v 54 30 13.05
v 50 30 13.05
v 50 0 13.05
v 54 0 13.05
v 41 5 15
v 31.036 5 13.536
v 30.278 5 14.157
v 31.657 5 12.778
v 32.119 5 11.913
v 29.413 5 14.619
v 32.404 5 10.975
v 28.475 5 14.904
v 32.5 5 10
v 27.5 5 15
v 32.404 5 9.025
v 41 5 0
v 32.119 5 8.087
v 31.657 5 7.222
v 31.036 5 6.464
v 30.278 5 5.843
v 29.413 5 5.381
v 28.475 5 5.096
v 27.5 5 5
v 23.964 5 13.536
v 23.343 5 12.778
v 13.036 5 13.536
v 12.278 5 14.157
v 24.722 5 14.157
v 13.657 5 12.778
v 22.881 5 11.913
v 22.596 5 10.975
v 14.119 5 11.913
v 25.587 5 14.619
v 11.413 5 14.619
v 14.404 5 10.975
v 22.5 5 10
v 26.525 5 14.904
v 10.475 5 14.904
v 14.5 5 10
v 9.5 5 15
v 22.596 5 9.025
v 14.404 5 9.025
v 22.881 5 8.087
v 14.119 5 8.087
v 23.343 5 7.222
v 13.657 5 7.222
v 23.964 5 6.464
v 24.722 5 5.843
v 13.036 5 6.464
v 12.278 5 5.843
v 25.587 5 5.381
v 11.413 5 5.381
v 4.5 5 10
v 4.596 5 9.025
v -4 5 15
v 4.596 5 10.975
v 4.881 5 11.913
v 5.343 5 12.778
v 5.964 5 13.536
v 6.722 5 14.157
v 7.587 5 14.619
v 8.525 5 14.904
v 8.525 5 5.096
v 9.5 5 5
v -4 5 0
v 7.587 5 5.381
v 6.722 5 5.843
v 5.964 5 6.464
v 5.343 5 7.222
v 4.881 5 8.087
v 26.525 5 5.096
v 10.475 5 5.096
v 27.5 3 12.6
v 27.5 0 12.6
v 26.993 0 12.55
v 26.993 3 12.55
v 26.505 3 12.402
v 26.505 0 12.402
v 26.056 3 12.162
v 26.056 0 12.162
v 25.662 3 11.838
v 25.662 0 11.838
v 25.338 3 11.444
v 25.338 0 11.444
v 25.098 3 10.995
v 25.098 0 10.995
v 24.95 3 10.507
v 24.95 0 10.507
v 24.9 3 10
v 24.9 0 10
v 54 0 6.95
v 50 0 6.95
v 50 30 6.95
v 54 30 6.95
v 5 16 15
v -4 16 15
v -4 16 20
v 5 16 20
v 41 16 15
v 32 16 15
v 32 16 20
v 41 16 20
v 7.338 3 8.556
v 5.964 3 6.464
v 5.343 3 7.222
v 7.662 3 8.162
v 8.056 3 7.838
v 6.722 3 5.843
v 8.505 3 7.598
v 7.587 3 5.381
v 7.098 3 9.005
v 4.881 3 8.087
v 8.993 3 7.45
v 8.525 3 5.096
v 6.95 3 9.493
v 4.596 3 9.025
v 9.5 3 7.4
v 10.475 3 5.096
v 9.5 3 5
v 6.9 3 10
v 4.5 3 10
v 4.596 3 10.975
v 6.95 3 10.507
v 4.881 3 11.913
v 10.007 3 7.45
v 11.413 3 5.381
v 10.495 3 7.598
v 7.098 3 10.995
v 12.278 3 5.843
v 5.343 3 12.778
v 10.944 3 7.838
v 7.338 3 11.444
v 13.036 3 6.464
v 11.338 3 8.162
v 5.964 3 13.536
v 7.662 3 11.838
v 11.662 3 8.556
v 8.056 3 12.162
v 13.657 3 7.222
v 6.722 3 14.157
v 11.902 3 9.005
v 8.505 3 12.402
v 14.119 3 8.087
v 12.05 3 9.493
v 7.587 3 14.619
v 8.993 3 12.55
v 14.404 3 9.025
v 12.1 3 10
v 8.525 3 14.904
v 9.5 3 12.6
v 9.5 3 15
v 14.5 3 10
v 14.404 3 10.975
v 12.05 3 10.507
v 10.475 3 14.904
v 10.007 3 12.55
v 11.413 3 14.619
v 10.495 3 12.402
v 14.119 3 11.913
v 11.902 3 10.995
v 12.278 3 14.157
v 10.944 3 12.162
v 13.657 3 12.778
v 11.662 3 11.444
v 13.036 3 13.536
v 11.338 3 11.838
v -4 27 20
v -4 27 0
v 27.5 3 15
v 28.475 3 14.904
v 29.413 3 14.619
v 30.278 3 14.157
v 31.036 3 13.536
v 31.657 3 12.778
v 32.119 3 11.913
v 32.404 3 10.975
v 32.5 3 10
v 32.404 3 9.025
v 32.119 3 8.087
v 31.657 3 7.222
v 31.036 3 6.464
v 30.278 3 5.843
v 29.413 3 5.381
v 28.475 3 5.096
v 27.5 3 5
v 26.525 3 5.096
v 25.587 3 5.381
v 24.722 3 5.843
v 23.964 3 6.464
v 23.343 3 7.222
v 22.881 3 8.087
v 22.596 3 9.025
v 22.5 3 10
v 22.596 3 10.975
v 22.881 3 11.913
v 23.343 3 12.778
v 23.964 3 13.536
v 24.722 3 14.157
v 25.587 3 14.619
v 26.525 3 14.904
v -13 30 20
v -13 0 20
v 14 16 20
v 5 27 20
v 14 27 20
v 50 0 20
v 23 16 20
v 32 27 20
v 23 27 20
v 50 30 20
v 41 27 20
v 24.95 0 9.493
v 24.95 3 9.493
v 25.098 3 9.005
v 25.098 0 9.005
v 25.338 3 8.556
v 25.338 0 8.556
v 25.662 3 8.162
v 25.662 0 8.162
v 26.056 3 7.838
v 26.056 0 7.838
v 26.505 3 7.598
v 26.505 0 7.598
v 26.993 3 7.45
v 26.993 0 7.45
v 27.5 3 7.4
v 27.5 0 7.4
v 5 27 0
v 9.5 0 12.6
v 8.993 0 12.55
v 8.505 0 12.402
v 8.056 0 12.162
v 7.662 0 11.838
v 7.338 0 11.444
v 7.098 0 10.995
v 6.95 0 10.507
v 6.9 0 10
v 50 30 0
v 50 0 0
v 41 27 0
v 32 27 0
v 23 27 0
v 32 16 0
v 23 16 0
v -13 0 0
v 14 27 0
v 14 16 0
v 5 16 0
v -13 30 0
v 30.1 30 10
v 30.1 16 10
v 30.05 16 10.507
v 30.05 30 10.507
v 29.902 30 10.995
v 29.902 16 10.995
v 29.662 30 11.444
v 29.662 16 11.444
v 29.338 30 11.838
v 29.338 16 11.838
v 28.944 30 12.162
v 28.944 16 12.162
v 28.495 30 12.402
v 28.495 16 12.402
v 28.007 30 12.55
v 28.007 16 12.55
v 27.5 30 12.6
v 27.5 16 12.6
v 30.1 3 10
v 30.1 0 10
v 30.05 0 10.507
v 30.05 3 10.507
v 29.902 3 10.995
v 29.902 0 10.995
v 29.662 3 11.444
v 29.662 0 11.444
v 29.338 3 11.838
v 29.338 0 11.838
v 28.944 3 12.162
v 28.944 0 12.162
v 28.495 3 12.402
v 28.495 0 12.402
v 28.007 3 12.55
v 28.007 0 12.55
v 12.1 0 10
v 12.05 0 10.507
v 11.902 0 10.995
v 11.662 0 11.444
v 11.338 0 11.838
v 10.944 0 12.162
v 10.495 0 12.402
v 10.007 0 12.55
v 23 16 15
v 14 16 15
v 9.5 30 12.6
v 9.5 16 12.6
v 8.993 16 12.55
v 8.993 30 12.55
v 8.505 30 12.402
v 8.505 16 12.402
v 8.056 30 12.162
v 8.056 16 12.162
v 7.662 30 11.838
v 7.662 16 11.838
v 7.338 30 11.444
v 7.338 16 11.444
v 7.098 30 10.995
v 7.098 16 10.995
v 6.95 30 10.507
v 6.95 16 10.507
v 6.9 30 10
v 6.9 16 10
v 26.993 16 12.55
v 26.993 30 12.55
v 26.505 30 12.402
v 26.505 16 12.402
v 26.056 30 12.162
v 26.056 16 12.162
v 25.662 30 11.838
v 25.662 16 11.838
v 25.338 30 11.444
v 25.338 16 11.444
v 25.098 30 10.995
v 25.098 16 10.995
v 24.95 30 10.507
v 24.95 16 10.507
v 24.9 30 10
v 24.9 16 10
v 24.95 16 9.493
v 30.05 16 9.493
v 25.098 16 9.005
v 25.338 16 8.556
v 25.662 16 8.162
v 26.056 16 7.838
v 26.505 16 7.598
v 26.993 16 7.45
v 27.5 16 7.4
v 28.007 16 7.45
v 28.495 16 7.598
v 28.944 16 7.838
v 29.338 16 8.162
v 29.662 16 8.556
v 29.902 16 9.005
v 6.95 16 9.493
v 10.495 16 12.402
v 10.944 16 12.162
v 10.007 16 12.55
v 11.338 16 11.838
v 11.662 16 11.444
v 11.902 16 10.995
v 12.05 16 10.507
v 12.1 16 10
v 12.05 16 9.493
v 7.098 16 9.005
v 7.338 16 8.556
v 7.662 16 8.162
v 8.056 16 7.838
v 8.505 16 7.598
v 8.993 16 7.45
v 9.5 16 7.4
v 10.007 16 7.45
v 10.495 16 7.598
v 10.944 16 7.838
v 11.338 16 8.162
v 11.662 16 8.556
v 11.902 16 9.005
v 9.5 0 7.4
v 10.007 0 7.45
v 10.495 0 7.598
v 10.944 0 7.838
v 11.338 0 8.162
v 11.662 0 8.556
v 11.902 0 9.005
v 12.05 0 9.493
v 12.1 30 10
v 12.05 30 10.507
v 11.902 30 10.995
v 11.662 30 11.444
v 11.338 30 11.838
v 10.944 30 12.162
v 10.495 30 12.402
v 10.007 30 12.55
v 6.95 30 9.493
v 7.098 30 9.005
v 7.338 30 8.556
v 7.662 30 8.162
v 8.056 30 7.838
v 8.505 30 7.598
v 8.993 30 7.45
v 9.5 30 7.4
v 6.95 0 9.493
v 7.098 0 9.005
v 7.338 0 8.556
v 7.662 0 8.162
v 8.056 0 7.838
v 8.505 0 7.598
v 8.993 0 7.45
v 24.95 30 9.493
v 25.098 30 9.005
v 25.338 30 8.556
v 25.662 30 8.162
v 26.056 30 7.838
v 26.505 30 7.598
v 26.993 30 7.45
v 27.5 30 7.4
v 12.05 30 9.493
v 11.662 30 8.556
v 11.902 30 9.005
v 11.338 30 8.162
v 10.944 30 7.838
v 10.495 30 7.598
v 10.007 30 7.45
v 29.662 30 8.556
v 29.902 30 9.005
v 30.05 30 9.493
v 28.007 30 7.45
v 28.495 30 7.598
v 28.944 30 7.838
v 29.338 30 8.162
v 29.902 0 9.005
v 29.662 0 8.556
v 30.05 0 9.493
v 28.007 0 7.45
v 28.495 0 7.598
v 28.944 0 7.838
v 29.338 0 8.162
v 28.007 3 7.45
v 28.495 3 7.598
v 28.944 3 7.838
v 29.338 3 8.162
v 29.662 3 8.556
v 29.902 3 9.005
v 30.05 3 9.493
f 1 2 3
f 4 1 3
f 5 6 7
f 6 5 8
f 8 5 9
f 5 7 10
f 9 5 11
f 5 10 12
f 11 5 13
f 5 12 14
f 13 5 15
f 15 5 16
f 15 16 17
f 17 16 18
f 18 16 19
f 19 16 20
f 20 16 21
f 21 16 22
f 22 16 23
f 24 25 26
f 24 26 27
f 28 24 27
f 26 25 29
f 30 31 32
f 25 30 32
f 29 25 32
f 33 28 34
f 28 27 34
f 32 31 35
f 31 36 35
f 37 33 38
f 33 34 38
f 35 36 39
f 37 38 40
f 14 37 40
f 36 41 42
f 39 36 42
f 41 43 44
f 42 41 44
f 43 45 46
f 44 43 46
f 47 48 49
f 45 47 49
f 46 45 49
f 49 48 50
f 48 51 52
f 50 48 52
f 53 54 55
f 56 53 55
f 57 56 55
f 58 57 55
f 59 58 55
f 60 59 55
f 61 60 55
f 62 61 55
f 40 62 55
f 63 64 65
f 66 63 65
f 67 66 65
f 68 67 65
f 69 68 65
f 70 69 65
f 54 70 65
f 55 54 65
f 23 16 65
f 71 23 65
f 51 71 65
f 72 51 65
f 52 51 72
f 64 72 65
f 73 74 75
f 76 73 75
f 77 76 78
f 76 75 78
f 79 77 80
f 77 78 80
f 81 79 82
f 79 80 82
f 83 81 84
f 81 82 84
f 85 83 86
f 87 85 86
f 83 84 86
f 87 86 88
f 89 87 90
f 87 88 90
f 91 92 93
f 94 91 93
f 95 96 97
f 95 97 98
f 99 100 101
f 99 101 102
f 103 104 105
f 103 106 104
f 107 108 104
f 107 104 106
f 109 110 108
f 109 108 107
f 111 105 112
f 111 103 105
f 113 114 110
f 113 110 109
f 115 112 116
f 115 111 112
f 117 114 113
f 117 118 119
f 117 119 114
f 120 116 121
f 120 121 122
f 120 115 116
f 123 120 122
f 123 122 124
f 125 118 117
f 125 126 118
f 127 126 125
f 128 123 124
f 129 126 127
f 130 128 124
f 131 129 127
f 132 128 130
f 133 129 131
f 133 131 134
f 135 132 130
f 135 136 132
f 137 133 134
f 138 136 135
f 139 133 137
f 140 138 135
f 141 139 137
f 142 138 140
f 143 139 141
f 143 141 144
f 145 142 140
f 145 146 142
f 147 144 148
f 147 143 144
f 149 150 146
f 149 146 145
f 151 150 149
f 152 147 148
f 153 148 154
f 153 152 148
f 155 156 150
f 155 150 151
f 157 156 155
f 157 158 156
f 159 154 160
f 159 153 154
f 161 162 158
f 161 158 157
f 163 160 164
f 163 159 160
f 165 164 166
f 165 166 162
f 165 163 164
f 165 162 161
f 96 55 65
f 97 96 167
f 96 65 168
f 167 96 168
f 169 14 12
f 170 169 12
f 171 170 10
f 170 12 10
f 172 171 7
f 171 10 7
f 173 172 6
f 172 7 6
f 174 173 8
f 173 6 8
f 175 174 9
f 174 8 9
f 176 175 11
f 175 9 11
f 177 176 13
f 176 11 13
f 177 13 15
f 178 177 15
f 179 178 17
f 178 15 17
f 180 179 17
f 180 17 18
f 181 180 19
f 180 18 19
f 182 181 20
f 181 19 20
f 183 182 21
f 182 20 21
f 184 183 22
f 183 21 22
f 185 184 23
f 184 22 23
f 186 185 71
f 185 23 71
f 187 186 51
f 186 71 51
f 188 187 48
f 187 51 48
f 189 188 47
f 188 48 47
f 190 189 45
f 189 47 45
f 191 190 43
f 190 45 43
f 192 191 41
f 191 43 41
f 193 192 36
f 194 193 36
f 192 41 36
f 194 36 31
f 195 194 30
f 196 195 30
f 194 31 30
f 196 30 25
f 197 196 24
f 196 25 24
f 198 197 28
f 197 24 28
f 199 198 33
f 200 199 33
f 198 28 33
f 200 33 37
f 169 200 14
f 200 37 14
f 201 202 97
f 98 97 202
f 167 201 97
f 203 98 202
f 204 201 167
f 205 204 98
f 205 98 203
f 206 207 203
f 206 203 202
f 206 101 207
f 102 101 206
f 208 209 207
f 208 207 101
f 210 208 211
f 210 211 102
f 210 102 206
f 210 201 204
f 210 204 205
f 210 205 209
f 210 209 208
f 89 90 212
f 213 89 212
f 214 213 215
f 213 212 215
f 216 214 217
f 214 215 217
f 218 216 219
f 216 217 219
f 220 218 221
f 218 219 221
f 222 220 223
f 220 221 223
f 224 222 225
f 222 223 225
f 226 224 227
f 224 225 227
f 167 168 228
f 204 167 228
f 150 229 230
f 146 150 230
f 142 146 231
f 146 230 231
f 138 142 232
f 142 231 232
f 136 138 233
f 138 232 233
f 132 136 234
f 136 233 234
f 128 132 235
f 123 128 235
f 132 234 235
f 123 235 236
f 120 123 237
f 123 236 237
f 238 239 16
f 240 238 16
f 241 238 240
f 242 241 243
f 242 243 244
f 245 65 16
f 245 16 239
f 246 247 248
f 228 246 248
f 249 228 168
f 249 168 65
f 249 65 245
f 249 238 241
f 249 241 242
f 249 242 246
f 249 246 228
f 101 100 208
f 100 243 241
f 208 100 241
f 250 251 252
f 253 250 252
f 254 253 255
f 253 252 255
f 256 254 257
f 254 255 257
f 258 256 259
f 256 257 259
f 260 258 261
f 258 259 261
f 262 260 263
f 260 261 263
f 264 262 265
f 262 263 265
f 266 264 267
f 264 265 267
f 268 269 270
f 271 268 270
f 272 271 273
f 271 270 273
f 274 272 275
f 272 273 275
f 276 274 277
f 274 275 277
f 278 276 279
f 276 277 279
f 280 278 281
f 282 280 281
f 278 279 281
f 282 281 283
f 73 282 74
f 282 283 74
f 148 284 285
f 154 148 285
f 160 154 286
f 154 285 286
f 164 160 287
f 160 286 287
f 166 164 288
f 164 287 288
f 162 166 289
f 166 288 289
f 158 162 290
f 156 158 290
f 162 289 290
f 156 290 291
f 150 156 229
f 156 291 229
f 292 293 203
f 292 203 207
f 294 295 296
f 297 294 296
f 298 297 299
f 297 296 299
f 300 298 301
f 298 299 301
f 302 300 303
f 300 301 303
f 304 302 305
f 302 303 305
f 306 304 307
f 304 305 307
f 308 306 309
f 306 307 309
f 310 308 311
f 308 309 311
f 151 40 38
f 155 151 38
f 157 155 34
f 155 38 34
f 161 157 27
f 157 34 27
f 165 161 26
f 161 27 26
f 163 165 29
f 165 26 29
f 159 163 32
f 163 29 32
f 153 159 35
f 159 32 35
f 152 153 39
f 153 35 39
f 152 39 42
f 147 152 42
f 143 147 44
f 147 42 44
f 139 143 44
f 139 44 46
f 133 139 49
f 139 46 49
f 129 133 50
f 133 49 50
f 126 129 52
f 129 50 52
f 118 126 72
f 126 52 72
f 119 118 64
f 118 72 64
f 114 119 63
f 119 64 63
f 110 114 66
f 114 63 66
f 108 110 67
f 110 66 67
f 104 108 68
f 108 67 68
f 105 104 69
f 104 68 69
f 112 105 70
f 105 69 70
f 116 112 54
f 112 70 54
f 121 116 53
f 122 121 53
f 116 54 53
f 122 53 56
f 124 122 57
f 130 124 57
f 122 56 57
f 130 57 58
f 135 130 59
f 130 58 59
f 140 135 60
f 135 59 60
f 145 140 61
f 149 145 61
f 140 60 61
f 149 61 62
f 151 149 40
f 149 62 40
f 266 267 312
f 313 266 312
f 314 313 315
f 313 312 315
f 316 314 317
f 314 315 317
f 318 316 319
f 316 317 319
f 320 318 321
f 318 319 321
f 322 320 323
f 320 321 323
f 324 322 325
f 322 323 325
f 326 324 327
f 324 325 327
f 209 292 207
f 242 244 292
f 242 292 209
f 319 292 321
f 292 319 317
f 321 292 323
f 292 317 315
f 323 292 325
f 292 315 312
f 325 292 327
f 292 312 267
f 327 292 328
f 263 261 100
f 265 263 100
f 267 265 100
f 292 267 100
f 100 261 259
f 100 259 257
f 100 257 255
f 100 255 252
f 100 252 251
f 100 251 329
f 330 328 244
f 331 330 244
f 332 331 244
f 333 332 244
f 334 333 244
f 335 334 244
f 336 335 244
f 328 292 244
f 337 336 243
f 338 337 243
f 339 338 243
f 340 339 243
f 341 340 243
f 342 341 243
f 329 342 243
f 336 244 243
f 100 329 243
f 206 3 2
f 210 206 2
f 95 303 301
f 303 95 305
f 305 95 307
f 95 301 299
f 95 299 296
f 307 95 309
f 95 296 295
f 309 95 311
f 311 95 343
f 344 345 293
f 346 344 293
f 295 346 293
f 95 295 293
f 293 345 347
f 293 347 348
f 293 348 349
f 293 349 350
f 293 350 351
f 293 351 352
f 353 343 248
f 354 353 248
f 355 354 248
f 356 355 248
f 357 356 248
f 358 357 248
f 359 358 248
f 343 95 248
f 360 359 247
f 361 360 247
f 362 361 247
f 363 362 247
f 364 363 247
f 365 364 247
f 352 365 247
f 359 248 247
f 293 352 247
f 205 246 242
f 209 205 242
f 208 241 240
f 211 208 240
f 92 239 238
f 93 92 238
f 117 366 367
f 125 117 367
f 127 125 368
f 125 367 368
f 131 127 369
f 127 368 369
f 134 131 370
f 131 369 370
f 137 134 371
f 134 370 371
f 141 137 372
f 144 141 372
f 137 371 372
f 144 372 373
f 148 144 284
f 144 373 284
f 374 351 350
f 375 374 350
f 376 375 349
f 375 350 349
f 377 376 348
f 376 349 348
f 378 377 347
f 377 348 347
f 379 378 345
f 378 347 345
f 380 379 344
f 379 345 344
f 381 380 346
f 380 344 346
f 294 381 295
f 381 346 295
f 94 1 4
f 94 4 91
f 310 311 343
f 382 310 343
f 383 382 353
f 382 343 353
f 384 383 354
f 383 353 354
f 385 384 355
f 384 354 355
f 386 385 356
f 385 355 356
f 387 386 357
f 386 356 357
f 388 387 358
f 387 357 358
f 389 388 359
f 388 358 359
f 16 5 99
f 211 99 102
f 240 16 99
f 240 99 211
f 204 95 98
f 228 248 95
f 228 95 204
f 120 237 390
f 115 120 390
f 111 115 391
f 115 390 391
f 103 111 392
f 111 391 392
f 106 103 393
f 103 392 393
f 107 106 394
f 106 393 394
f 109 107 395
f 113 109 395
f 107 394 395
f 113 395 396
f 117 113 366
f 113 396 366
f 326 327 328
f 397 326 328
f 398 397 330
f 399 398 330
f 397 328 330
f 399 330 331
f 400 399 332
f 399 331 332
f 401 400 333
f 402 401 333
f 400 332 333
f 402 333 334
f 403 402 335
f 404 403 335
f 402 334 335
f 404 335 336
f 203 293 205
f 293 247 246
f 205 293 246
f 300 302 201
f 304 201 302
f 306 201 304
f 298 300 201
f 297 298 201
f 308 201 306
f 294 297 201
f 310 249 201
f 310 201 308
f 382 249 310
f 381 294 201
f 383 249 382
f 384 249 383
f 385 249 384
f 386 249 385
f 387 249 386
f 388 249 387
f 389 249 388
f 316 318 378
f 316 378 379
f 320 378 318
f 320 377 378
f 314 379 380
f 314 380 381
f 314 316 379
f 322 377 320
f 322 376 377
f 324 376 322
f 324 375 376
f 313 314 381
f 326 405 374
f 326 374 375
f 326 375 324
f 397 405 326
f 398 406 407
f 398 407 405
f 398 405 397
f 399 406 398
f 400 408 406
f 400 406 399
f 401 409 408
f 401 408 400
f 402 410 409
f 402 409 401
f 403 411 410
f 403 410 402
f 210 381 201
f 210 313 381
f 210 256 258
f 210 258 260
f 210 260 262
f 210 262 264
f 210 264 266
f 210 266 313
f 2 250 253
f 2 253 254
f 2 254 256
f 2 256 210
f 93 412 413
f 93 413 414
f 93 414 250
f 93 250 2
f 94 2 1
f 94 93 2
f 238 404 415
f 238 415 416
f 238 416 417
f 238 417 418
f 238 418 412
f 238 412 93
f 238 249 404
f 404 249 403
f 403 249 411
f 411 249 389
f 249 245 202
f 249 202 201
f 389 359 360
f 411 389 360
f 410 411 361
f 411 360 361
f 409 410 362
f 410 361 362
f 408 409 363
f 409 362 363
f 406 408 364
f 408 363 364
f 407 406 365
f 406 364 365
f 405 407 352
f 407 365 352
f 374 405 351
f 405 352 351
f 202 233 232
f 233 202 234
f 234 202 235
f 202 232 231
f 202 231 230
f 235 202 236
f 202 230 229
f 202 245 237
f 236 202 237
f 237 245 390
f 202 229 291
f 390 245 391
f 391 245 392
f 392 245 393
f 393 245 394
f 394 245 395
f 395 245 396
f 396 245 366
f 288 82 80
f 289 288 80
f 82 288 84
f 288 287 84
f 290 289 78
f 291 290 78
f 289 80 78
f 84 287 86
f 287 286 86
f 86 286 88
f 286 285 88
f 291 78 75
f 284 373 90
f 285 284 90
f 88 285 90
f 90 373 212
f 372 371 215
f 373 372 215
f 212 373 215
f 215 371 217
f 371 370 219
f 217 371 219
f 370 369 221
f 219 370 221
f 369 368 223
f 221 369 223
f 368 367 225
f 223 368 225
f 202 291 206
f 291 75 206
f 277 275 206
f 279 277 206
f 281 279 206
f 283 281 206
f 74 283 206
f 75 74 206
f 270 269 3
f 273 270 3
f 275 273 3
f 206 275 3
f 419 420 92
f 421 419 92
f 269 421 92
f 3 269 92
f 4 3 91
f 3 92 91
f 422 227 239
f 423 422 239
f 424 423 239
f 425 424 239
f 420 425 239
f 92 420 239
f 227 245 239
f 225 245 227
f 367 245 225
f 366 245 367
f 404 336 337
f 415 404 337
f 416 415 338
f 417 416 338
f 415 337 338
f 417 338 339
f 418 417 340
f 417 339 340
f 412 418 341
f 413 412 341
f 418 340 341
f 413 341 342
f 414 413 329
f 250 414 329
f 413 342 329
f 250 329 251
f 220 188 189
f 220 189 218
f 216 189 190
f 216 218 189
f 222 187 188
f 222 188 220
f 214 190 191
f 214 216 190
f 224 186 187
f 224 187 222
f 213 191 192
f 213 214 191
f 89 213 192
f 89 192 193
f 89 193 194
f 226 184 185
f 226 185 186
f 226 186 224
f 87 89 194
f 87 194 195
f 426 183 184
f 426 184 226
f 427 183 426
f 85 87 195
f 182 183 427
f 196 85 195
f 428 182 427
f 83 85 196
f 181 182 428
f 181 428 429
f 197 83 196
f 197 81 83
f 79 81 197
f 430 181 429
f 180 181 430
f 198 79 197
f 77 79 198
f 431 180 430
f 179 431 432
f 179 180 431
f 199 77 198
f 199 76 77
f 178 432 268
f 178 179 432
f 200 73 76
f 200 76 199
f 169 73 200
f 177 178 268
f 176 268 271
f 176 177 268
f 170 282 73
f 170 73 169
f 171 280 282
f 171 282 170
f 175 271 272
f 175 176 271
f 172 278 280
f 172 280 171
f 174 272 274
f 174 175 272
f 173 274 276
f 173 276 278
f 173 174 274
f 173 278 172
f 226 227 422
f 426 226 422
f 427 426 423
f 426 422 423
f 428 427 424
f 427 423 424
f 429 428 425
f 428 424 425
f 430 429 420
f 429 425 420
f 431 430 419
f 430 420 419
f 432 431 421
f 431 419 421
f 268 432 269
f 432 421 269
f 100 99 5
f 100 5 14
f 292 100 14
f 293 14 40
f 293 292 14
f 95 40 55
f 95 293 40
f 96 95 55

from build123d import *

# Parameters (mm, degrees)
SKETCH_1_W          = 63
SKETCH_1_H          = 30
SKETCH_1_W_2        = 9
SKETCH_1_H_2        = 11
EXTRUDE_2_DEPTH     = 20
SKETCH_2_W          = 9
SKETCH_2_H          = 11
CUT_EXTRUDE_1_DEPTH = 15
SKETCH_3_W          = 9
SKETCH_3_H          = 11
EXTRUDE_3_DEPTH     = 15
CUT_EXTRUDE_2_DEPTH = 100
SKETCH_6_R          = 5
CUT_EXTRUDE_3_DEPTH = 2
SKETCH_7_W          = 3.05
SKETCH_7_H          = 15
EXTRUDE_4_DEPTH     = 4


with BuildPart() as part:
    # 草图1 → 凸台-拉伸2 (new body)
    with BuildSketch(Plane.XY):
        with Locations((18.5, 15)):
            Rectangle(SKETCH_1_W, SKETCH_1_H)
        with Locations((18.5, 21.5)):
            Rectangle(SKETCH_1_W_2, SKETCH_1_H_2, mode=Mode.SUBTRACT)
        with Locations((36.5, 21.5)):
            Rectangle(SKETCH_1_W_2, SKETCH_1_H_2, mode=Mode.SUBTRACT)
        with Locations((0.5, 21.5)):
            Rectangle(SKETCH_1_W_2, SKETCH_1_H_2, mode=Mode.SUBTRACT)
    extrude(amount=EXTRUDE_2_DEPTH)

    # 草图2 → 切除-拉伸1 (cut)
    with BuildSketch(Plane(origin=(0, 0, 0), x_dir=(-1, 0, 0), z_dir=(0, 0, -1))):
        Polygon((-50, 16), (-50, 5), (4, 5), (4, 16), (-5, 16), (-14, 16), (-23, 16), (-32, 16), (-41, 16), align=None)
        with Locations((8.5, 10.5)):
            Rectangle(SKETCH_2_W, SKETCH_2_H)
    extrude(amount=-CUT_EXTRUDE_1_DEPTH, mode=Mode.SUBTRACT)

    # 草图3 → 凸台-拉伸3 (add)
    with BuildSketch(Plane(origin=(0, 0, 0), x_dir=(-1, 0, 0), z_dir=(0, 0, -1))):
        with Locations((-45.5, 10.5)):
            Rectangle(SKETCH_3_W, SKETCH_3_H)
        with Locations((8.5, 10.5)):
            Rectangle(SKETCH_3_W, SKETCH_3_H)
    extrude(amount=-EXTRUDE_3_DEPTH)

    # 草图5 → 切除-拉伸2 (cut)
    with BuildSketch(Plane.XZ):
        with BuildLine():
            ThreePointArc((27.5, 12.6), (25.661522369, 11.838477631), (24.9, 10))
            Line((24.9, 10), (27.5, 10))
            Line((27.5, 10), (27.5, 12.6))
        make_face()
        with BuildLine():
            Line((27.5, 10), (24.9, 10))
            ThreePointArc((24.9, 10), (25.661522369, 8.161522369), (27.5, 7.4))
            Line((27.5, 7.4), (27.5, 10))
        make_face()
        with BuildLine():
            Line((30.1, 10), (27.5, 10))
            Line((27.5, 10), (27.5, 7.4))
            ThreePointArc((27.5, 7.4), (29.338477631, 8.161522369), (30.1, 10))
        make_face()
        with BuildLine():
            Line((27.5, 12.6), (27.5, 10))
            Line((27.5, 10), (30.1, 10))
            ThreePointArc((30.1, 10), (29.338477631, 11.838477631), (27.5, 12.6))
        make_face()
        with BuildLine():
            Line((9.5, 10), (9.5, 7.4))
            ThreePointArc((9.5, 7.4), (11.338477631, 8.161522369), (12.1, 10))
            Line((12.1, 10), (9.5, 10))
        make_face()
        with BuildLine():
            Line((9.5, 12.6), (9.5, 10))
            Line((9.5, 10), (12.1, 10))
            ThreePointArc((12.1, 10), (11.338477631, 11.838477631), (9.5, 12.6))
        make_face()
        with BuildLine():
            ThreePointArc((6.9, 10), (7.661522369, 8.161522369), (9.5, 7.4))
            Line((9.5, 7.4), (9.5, 10))
            Line((9.5, 10), (6.9, 10))
        make_face()
        with BuildLine():
            Line((6.9, 10), (9.5, 10))
            Line((9.5, 10), (9.5, 12.6))
            ThreePointArc((9.5, 12.6), (7.661522369, 11.838477631), (6.9, 10))
        make_face()
    extrude(amount=-CUT_EXTRUDE_2_DEPTH, mode=Mode.SUBTRACT)

    # 草图6 → 切除-拉伸3 (cut)
    with BuildSketch(Plane(origin=(0, 5, 0), x_dir=(1, 0, 0), z_dir=(0, 1, 0))):
        with Locations(Location((9.5, -10, 0), (0, 0, 270))):
            Circle(SKETCH_6_R)
        with Locations(Location((27.5, -10, 0), (0, 0, 270))):
            Circle(SKETCH_6_R)
    extrude(amount=-CUT_EXTRUDE_3_DEPTH, mode=Mode.SUBTRACT)

    # 草图7 → 凸台-拉伸4 (add)
    with BuildSketch(Plane(origin=(50, 0, 0), x_dir=(0, 0, -1), z_dir=(1, 0, 0))):
        with Locations((-8.475, 22.5)):
            Rectangle(SKETCH_7_W, SKETCH_7_H)
        with Locations((-11.525, 22.5)):
            Rectangle(SKETCH_7_W, SKETCH_7_H)
        with Locations((-11.525, 7.5)):
            Rectangle(SKETCH_7_W, SKETCH_7_H)
        with Locations((-8.475, 7.5)):
            Rectangle(SKETCH_7_W, SKETCH_7_H)
    extrude(amount=EXTRUDE_4_DEPTH)


solid = part.part
